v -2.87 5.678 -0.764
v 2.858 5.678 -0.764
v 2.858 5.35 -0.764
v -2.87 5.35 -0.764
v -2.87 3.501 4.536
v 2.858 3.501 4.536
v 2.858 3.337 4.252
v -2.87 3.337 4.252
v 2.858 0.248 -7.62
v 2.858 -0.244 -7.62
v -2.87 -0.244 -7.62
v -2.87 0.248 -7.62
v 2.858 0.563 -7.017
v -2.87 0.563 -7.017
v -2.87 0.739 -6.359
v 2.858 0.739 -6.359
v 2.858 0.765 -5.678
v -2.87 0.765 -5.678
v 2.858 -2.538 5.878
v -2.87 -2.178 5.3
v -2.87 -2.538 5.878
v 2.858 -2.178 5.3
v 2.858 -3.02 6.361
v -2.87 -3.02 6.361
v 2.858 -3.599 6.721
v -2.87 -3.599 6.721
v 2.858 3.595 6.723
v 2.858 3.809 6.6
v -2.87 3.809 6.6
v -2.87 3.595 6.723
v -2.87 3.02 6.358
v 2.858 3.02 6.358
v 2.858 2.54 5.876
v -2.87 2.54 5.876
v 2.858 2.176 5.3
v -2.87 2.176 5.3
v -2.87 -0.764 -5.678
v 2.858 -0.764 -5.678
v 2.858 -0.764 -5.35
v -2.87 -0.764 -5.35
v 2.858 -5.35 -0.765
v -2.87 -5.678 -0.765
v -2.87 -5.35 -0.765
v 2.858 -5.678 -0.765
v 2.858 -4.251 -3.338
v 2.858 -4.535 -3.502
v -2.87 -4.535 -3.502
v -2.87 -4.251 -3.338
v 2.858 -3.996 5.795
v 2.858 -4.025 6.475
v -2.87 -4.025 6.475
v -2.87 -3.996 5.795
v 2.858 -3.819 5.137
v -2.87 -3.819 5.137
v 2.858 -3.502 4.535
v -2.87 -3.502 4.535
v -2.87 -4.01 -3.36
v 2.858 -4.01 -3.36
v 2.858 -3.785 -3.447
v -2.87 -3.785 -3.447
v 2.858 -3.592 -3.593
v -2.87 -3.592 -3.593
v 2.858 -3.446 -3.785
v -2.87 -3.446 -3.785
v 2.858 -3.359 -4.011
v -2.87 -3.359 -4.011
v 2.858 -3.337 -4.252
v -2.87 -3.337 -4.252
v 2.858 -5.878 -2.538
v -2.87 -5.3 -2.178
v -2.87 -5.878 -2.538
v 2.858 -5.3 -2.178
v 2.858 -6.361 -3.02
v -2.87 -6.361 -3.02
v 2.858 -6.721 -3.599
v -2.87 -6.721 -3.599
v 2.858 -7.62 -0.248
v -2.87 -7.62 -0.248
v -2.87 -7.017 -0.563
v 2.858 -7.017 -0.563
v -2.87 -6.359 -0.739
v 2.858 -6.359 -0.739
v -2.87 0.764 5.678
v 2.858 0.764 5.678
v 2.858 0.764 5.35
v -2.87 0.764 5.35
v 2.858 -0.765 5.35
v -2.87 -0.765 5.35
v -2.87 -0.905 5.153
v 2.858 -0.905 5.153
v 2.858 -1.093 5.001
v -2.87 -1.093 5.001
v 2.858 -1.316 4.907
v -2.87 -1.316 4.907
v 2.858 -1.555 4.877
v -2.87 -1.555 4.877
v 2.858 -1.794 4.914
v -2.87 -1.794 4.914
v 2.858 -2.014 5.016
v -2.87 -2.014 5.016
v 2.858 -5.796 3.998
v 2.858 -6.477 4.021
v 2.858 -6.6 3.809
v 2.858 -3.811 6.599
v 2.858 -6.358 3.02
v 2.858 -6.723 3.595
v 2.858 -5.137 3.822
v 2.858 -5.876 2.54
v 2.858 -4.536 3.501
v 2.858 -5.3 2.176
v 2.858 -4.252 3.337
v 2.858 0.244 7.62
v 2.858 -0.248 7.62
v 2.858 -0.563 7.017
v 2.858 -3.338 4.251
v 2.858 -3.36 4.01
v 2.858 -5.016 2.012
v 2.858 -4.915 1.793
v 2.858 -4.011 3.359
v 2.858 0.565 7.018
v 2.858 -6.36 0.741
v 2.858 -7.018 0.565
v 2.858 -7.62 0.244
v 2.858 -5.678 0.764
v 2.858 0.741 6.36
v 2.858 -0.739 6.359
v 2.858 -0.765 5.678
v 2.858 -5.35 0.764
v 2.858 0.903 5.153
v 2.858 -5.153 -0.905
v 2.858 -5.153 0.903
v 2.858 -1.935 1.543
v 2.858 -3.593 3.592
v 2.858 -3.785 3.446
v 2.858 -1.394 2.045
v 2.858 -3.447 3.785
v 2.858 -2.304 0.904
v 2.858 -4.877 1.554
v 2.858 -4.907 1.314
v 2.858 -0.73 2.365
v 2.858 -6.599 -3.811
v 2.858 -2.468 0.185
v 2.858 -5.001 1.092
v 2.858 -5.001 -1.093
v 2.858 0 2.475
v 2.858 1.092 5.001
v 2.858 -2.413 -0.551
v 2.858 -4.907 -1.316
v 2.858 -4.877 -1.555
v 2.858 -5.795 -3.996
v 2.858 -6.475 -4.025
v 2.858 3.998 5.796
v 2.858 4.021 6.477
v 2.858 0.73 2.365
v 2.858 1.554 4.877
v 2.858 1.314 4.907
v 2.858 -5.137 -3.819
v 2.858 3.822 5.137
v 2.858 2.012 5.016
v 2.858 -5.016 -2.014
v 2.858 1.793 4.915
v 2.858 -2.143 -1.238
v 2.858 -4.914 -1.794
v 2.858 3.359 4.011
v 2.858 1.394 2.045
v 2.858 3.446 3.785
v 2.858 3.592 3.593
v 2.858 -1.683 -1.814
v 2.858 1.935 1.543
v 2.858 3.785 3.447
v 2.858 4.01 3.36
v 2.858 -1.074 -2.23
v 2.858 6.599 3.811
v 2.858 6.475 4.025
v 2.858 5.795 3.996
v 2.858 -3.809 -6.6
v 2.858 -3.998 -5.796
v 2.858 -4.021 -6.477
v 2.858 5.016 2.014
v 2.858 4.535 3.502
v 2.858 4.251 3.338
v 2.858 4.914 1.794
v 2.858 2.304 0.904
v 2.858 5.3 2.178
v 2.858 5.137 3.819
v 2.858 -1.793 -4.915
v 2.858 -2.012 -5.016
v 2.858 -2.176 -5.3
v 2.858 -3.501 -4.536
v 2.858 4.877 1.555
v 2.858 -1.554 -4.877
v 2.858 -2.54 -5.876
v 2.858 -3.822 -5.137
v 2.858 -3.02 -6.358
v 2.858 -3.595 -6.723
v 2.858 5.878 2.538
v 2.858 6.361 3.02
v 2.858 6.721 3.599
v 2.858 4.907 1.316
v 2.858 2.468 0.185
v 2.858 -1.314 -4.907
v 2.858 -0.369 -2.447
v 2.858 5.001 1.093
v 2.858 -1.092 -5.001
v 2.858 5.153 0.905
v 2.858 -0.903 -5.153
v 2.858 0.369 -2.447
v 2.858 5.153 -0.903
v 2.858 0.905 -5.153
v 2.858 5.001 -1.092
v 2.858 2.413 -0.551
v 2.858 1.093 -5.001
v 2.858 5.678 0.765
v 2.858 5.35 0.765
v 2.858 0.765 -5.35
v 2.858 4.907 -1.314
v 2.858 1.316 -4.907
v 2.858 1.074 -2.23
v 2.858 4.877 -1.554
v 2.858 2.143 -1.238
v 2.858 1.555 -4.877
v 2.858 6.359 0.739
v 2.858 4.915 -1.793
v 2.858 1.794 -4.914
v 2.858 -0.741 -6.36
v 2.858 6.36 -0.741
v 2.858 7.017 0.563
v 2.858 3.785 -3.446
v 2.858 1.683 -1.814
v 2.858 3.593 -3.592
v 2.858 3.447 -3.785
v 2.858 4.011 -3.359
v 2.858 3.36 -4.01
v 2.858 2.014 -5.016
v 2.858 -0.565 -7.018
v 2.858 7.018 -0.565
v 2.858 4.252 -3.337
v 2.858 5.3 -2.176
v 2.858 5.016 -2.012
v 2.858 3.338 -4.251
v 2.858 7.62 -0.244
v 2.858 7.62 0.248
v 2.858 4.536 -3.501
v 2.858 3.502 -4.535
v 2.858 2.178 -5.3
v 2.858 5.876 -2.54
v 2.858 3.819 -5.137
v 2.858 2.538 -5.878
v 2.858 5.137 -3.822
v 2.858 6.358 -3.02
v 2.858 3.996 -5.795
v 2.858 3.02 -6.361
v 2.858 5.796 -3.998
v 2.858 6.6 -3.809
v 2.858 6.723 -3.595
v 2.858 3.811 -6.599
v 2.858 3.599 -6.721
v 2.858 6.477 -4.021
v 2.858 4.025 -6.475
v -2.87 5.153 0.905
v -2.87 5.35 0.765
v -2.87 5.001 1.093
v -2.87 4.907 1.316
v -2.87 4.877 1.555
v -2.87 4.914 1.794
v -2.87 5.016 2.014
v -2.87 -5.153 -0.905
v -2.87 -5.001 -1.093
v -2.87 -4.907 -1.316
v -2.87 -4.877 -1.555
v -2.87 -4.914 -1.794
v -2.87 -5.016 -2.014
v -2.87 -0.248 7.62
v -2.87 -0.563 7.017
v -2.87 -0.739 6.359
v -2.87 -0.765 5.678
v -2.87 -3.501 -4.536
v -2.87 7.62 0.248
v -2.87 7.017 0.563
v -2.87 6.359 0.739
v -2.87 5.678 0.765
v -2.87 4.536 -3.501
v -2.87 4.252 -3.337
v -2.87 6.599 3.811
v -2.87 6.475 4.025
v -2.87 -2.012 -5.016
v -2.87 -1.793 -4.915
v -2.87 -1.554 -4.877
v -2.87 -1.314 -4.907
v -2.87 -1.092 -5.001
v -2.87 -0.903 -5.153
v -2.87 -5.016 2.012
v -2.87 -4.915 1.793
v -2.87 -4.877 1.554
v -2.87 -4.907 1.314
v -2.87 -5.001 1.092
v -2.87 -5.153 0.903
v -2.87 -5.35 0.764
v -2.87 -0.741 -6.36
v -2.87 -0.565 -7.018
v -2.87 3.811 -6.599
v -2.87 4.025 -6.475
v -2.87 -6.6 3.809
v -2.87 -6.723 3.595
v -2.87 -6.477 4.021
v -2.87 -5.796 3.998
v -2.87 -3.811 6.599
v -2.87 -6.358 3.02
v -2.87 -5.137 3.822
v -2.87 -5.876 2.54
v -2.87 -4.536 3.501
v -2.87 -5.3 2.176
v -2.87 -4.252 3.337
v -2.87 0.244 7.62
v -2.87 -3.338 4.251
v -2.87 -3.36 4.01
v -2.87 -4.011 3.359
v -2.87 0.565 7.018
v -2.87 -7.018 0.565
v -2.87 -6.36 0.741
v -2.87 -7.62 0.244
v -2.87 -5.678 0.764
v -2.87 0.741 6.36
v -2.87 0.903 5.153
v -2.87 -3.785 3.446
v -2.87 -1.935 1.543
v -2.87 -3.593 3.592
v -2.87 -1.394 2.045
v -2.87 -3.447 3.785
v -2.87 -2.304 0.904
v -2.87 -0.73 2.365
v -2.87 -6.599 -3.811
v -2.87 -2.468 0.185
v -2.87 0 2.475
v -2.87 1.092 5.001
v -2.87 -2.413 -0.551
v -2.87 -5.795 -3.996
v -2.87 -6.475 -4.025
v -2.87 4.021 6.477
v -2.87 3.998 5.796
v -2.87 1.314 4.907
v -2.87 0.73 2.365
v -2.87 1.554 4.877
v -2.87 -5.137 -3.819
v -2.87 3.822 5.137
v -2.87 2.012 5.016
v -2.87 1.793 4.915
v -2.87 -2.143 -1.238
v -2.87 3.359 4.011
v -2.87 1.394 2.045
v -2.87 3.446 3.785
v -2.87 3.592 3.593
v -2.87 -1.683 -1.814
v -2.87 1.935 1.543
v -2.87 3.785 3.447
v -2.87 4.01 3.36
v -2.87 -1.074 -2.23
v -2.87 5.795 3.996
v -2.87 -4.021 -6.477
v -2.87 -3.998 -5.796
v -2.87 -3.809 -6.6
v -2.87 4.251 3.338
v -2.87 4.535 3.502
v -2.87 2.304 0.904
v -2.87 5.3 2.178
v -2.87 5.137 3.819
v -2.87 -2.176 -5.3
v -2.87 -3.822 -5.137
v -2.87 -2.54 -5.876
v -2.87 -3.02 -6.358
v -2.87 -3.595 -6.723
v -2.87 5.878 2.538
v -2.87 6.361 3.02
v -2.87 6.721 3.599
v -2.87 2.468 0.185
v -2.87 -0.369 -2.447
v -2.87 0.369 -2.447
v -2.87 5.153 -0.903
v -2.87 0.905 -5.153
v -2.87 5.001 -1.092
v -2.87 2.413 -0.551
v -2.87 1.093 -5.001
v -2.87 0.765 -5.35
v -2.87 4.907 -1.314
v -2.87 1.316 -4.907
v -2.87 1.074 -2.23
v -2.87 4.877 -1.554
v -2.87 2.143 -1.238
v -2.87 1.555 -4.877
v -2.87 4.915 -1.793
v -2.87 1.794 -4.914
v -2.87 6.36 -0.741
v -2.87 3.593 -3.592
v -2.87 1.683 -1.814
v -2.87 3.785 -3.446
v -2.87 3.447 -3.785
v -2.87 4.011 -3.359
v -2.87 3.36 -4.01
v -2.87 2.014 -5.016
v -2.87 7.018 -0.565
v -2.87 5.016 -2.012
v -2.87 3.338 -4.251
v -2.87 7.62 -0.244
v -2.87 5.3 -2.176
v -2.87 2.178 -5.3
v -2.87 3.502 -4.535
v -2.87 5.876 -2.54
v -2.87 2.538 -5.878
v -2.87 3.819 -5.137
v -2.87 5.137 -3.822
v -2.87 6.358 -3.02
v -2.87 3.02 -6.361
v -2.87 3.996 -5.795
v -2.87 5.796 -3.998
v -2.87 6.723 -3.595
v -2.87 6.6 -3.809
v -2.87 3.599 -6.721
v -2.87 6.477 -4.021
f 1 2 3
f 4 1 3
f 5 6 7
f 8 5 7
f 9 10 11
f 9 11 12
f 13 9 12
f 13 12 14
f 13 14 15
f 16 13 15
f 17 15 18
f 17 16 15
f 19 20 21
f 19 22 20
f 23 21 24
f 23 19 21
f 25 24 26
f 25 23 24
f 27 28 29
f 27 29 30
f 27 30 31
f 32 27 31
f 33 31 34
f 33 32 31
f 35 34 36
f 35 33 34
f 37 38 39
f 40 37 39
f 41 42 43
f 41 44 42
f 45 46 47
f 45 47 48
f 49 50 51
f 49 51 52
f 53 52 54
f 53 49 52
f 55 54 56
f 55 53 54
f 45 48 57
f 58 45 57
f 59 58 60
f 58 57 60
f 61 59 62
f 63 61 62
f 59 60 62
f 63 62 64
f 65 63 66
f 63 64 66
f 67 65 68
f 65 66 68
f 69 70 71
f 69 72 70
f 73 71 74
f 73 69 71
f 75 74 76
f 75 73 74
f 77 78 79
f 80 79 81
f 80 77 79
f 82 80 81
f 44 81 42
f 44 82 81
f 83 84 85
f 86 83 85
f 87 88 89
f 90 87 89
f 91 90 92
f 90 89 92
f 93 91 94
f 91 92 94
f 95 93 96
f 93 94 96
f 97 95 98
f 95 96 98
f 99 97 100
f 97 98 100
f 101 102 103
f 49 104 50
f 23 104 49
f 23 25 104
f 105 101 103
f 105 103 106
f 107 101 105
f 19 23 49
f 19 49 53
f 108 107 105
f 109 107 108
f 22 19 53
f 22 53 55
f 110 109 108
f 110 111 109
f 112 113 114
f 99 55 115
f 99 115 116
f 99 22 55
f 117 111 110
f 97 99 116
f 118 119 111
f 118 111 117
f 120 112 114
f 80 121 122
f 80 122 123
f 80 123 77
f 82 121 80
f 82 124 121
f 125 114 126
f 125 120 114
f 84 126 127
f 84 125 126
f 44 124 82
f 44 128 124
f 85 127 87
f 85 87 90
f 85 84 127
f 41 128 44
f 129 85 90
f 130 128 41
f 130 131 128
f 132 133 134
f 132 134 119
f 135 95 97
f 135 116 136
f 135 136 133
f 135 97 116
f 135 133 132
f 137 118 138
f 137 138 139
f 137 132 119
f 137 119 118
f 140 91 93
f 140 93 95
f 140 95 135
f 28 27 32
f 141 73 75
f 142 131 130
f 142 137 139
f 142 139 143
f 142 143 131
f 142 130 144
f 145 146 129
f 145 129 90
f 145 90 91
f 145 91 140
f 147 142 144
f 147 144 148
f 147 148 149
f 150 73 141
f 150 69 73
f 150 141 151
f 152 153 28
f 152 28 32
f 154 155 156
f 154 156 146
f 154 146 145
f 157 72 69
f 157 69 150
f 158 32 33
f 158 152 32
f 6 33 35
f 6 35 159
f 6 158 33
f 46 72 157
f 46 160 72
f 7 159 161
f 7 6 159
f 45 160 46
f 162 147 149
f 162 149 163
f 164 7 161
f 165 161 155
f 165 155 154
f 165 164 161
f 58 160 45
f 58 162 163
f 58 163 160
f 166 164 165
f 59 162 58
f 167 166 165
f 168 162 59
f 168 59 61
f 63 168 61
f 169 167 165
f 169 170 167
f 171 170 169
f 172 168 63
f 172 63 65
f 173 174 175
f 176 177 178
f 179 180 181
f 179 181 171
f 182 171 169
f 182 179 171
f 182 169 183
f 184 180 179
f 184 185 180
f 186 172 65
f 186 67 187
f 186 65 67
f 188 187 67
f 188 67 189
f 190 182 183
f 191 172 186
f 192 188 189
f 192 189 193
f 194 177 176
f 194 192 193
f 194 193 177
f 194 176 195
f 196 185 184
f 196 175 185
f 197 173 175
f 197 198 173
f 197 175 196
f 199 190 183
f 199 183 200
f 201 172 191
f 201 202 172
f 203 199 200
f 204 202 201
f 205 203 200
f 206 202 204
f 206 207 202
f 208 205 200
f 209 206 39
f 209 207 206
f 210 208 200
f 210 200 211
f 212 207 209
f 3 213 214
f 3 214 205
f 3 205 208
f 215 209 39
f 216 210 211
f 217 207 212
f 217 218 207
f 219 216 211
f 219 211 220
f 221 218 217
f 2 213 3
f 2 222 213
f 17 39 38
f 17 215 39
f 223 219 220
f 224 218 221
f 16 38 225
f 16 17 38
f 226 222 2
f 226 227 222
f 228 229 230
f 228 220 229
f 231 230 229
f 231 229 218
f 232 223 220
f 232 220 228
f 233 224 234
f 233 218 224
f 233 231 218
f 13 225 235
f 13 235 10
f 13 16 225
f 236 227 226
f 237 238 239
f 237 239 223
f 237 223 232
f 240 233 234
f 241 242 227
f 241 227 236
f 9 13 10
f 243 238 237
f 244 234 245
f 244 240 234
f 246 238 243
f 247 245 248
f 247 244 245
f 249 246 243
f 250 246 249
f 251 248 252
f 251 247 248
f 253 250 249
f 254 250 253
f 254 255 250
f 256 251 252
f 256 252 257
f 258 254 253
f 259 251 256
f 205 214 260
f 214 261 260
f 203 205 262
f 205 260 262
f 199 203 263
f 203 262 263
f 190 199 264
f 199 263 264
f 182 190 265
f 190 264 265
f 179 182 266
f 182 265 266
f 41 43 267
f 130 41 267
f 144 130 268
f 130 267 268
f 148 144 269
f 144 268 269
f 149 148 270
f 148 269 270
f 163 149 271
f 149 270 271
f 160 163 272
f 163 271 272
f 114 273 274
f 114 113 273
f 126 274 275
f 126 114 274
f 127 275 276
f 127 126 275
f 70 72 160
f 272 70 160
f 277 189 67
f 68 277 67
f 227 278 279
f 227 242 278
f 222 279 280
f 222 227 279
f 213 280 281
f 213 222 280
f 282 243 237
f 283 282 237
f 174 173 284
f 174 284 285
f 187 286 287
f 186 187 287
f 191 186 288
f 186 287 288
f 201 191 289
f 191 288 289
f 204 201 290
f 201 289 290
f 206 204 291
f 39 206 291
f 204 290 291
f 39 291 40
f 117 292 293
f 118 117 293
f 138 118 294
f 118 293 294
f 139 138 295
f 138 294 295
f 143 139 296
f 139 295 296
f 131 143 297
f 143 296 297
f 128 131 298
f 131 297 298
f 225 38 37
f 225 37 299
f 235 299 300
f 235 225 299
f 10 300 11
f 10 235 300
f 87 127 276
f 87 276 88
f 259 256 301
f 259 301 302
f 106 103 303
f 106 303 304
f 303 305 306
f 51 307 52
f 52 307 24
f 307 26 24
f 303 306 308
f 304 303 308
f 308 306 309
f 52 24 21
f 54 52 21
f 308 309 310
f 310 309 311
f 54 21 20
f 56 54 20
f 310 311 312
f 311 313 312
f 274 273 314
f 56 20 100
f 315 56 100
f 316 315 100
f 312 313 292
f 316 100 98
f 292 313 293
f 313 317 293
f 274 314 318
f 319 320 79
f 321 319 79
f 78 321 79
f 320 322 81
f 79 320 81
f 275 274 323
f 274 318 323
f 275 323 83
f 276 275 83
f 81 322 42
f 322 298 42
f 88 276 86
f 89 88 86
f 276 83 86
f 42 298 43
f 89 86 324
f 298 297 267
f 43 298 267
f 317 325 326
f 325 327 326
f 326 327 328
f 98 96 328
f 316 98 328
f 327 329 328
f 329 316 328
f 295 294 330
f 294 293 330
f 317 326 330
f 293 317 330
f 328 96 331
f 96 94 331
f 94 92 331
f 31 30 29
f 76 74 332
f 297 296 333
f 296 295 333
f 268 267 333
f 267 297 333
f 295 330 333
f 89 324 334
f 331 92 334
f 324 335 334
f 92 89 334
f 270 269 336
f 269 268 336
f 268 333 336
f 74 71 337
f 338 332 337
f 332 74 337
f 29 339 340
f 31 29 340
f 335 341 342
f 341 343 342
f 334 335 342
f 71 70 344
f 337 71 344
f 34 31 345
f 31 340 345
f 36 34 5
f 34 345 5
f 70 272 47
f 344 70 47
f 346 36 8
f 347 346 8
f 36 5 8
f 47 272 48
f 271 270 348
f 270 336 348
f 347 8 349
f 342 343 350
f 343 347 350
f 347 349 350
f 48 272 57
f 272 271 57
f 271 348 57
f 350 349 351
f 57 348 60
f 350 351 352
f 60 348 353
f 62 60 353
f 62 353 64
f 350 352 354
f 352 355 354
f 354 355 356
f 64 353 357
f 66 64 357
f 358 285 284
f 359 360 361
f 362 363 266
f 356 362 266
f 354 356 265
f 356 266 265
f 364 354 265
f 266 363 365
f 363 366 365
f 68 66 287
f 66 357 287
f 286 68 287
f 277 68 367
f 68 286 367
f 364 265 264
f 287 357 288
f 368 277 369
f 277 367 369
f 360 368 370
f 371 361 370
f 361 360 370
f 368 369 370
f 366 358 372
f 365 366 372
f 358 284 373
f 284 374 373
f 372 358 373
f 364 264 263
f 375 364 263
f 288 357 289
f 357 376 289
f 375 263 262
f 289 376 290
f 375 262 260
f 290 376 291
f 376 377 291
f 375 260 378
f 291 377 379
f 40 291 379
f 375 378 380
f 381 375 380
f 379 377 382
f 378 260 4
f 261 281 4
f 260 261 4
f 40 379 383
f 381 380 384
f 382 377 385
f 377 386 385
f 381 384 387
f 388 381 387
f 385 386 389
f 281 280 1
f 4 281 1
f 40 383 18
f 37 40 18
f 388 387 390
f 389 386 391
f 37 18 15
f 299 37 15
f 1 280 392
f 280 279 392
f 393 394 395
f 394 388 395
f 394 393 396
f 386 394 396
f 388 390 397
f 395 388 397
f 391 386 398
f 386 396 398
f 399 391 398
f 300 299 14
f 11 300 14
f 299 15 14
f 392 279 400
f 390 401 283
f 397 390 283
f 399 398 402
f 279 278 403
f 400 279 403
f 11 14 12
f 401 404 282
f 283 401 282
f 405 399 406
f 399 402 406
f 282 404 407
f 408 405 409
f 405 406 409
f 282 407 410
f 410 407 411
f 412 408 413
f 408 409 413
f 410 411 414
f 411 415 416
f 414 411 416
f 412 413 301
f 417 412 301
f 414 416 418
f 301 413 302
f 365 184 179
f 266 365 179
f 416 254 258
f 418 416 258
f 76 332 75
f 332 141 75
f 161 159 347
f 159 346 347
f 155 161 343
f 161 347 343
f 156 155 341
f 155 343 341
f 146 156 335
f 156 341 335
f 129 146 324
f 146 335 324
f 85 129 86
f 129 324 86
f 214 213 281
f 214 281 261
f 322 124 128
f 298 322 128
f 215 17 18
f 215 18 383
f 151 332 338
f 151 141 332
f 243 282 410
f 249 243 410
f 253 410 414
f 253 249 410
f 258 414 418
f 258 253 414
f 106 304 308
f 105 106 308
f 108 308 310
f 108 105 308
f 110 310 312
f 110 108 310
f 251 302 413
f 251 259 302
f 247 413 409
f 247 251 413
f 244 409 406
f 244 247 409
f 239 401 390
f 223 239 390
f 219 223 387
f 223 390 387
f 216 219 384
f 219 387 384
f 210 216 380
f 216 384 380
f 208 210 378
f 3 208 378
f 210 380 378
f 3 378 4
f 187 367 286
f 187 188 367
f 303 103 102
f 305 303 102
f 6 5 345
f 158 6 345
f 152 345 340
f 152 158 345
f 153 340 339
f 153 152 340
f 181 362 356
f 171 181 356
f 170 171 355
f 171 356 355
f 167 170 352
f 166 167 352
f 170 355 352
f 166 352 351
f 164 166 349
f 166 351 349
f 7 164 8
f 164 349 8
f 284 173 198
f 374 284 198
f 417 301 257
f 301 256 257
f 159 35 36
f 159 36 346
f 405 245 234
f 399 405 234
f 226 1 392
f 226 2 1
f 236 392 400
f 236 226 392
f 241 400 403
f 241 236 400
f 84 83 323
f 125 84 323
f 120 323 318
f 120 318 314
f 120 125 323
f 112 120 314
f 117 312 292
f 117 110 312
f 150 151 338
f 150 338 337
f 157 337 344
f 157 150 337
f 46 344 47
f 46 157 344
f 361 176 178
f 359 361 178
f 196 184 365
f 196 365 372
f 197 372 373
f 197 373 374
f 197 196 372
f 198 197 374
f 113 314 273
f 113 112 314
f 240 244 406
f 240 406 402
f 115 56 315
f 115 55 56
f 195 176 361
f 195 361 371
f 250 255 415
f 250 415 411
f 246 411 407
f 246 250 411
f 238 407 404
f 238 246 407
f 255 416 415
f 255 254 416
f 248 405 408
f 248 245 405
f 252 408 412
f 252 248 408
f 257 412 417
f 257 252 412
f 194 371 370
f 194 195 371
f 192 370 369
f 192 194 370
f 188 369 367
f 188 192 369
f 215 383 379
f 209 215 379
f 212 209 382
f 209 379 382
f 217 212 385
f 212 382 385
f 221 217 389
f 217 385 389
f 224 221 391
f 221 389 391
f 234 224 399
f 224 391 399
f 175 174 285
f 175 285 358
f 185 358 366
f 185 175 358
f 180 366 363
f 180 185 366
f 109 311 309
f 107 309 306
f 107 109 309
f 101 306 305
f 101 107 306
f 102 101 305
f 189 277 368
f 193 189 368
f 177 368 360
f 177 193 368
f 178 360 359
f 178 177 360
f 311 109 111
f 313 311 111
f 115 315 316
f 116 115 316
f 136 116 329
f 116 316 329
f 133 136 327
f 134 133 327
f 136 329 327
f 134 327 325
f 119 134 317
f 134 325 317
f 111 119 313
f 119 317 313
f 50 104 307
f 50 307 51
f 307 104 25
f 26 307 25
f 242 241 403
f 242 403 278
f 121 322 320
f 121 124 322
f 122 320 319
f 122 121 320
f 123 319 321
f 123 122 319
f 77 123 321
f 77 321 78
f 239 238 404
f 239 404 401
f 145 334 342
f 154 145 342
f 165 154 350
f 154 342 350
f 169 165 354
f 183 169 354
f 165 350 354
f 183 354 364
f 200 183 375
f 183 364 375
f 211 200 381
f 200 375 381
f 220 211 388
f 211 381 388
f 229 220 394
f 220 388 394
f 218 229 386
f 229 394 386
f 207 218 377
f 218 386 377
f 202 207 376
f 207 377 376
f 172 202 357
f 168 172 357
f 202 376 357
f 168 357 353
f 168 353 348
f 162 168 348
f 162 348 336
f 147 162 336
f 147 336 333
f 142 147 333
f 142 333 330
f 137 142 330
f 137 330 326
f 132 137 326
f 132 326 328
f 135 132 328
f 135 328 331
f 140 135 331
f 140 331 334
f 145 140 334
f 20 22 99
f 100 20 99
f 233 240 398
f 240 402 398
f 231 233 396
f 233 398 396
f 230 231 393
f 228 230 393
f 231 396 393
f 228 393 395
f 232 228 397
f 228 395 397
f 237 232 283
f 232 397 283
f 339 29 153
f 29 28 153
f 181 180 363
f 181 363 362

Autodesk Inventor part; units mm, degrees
ref_plane "YZ Plane" through (0, 0, 0) normal (1, 0, 0) x (0, 1, 0)
ref_plane "XZ Plane" through (0, 0, 0) normal (0, 1, 0) x (-1, 0, 0)
ref_plane "Work Plane2" through (2.8575, 0, 0) normal (1, 0, 0) x (0, 0, -1)
sketch "Sketch6" plane through (2.8575, 0, 0) normal (1, 0, 0) x (0, 0, -1)
  line L0 (0.7654, -5.6784) -> (0.7654, -5.022)
  line L1 (-0.7638, -5.6784) -> (-0.7638, -5.0222)
  arc A0 (5.6006, 2.3498) -> (5.5837, 2.3418) centre (6.3532, 0.7382) ccw
  arc A1 (-0.7638, -5.0222) -> (0.7654, -5.022) centre (0, 0) ccw
  line L2 (0.0008, -7.62) -> (-0.2439, -7.62)
  line L3 (0.0008, -7.62) -> (0.2479, -7.62)
  arc A2 (0.2479, -7.62) -> (0.7654, -5.6784) centre (-2.309, -5.8988) ccw
  arc A3 (-0.7638, -5.6784) -> (-0.2439, -7.62) centre (2.2185, -5.9201) ccw
  arc A4 (3.5877, -3.5965) -> (3.5976, -3.5866) centre (0, 0) ccw
  line L4 (3.502, -4.5349) -> (3.1738, -3.9665)
  line L5 (2.1777, -5.2996) -> (1.8496, -4.7313)
  arc A5 (1.8496, -4.7313) -> (3.1738, -3.9665) centre (0, 0) ccw
  line L6 (3.8107, -6.5987) -> (3.5988, -6.721)
  line L7 (3.8107, -6.5987) -> (4.0247, -6.4752)
  arc A6 (4.0247, -6.4752) -> (3.502, -4.5349) centre (0.9498, -6.263) ccw
  arc A7 (2.1777, -5.2996) -> (3.5988, -6.721) centre (4.8813, -4.0177) ccw
  line L8 (5.3003, -2.1764) -> (4.7319, -1.8482)
  line L9 (4.5358, -3.5007) -> (3.9675, -3.1726)
  arc A8 (3.9675, -3.1726) -> (4.7319, -1.8482) centre (0, 0) ccw
  line L10 (6.5995, -3.8093) -> (6.4772, -4.0212)
  line L11 (6.5995, -3.8093) -> (6.7231, -3.5953)
  arc A9 (6.7231, -3.5953) -> (5.3003, -2.1764) centre (3.954, -4.949) ccw
  arc A10 (4.5358, -3.5007) -> (6.4772, -4.0212) centre (6.2362, -1.0388) ccw
  line L12 (5.6784, 0.7654) -> (5.022, 0.7654)
  line L13 (5.6784, -0.7638) -> (5.0222, -0.7638)
  arc A11 (5.0222, -0.7638) -> (5.022, 0.7654) centre (0, 0) ccw
  line L14 (7.62, 0.0008) -> (7.62, -0.2439)
  line L15 (7.62, 0.0008) -> (7.62, 0.2479)
  arc A12 (7.62, 0.2479) -> (5.6784, 0.7654) centre (5.8988, -2.309) ccw
  arc A13 (5.6784, -0.7638) -> (7.62, -0.2439) centre (5.9201, 2.2185) ccw
  line L16 (4.5349, 3.502) -> (3.9665, 3.1738)
  line L17 (5.2996, 2.1777) -> (4.7313, 1.8496)
  arc A14 (4.7313, 1.8496) -> (3.9665, 3.1738) centre (0, 0) ccw
  line L18 (6.5987, 3.8107) -> (6.721, 3.5988)
  line L19 (6.5987, 3.8107) -> (6.4752, 4.0247)
  arc A15 (6.4752, 4.0247) -> (4.5349, 3.502) centre (6.263, 0.9498) ccw
  arc A16 (5.2996, 2.1777) -> (6.721, 3.5988) centre (4.0177, 4.8813) ccw
  line L20 (2.1764, 5.3003) -> (1.8482, 4.7319)
  line L21 (3.5007, 4.5358) -> (3.1726, 3.9675)
  arc A17 (3.1726, 3.9675) -> (1.8482, 4.7319) centre (0, 0) ccw
  line L22 (3.8093, 6.5995) -> (4.0212, 6.4772)
  line L23 (3.8093, 6.5995) -> (3.5953, 6.7231)
  arc A18 (3.5953, 6.7231) -> (2.1764, 5.3003) centre (4.949, 3.954) ccw
  arc A19 (3.5007, 4.5358) -> (4.0212, 6.4772) centre (1.0388, 6.2362) ccw
  line L24 (-0.7654, 5.6784) -> (-0.7654, 5.022)
  line L25 (0.7638, 5.6784) -> (0.7638, 5.0222)
  arc A20 (0.7638, 5.0222) -> (-0.7654, 5.022) centre (0, 0) ccw
  line L26 (-0.0008, 7.62) -> (0.2439, 7.62)
  line L27 (-0.0008, 7.62) -> (-0.2479, 7.62)
  arc A21 (-0.2479, 7.62) -> (-0.7654, 5.6784) centre (2.309, 5.8988) ccw
  arc A22 (0.7638, 5.6784) -> (0.2439, 7.62) centre (-2.2185, 5.9201) ccw
  line L28 (-3.502, 4.5349) -> (-3.1738, 3.9665)
  line L29 (-2.1777, 5.2996) -> (-1.8496, 4.7313)
  arc A23 (-1.8496, 4.7313) -> (-3.1738, 3.9665) centre (0, 0) ccw
  line L30 (-3.8107, 6.5987) -> (-3.5988, 6.721)
  line L31 (-3.8107, 6.5987) -> (-4.0247, 6.4752)
  arc A24 (-4.0247, 6.4752) -> (-3.502, 4.5349) centre (-0.9498, 6.263) ccw
  arc A25 (-2.1777, 5.2996) -> (-3.5988, 6.721) centre (-4.8813, 4.0177) ccw
  line L32 (-5.3003, 2.1764) -> (-4.7319, 1.8482)
  line L33 (-4.5358, 3.5007) -> (-3.9675, 3.1726)
  arc A26 (-3.9675, 3.1726) -> (-4.7319, 1.8482) centre (0, 0) ccw
  line L34 (-6.5995, 3.8093) -> (-6.4772, 4.0212)
  line L35 (-6.5995, 3.8093) -> (-6.7231, 3.5953)
  arc A27 (-6.7231, 3.5953) -> (-5.3003, 2.1764) centre (-3.954, 4.949) ccw
  arc A28 (-4.5358, 3.5007) -> (-6.4772, 4.0212) centre (-6.2362, 1.0388) ccw
  line L36 (-5.6784, -0.7654) -> (-5.022, -0.7654)
  line L37 (-5.6784, 0.7638) -> (-5.0222, 0.7638)
  arc A29 (-5.0222, 0.7638) -> (-5.022, -0.7654) centre (0, 0) ccw
  line L38 (-7.62, -0.0008) -> (-7.62, 0.2439)
  line L39 (-7.62, -0.0008) -> (-7.62, -0.2479)
  arc A30 (-7.62, -0.2479) -> (-5.6784, -0.7654) centre (-5.8988, 2.309) ccw
  arc A31 (-5.6784, 0.7638) -> (-7.62, 0.2439) centre (-5.9201, -2.2185) ccw
  line L40 (-4.5349, -3.502) -> (-3.9665, -3.1738)
  line L41 (-5.2996, -2.1777) -> (-4.7313, -1.8496)
  arc A32 (-4.7313, -1.8496) -> (-3.9665, -3.1738) centre (0, 0) ccw
  line L42 (-6.5987, -3.8107) -> (-6.721, -3.5988)
  line L43 (-6.5987, -3.8107) -> (-6.4752, -4.0247)
  arc A33 (-6.4752, -4.0247) -> (-4.5349, -3.502) centre (-6.263, -0.9498) ccw
  arc A34 (-5.2996, -2.1777) -> (-6.721, -3.5988) centre (-4.0177, -4.8813) ccw
  line L44 (-2.1764, -5.3003) -> (-1.8482, -4.7319)
  line L45 (-3.5007, -4.5358) -> (-3.1726, -3.9675)
  arc A35 (-3.1726, -3.9675) -> (-1.8482, -4.7319) centre (0, 0) ccw
  line L46 (-3.8093, -6.5995) -> (-4.0212, -6.4772)
  line L47 (-3.8093, -6.5995) -> (-3.5953, -6.7231)
  arc A36 (-3.5953, -6.7231) -> (-2.1764, -5.3003) centre (-4.949, -3.954) ccw
  arc A37 (-3.5007, -4.5358) -> (-4.0212, -6.4772) centre (-1.0388, -6.2362) ccw
  arc A38 (-1.8482, -4.7319) -> (-0.7638, -5.0222) centre (0, 0) ccw
  line L48 (-2.0137, 5.0155) -> (-0.7654, 5.3502)
  line L49 (0.7638, 5.3503) -> (2.0123, 5.0161)
  line L50 (3.3367, 4.2516) -> (4.2507, 3.3379)
  line L51 (5.0155, 2.0137) -> (5.3502, 0.7654)
  line L52 (5.3503, -0.7638) -> (5.0161, -2.0123)
  line L53 (4.2516, -3.3367) -> (3.3379, -4.2507)
  line L54 (2.0137, -5.0155) -> (0.7654, -5.3502)
  line L55 (-0.7638, -5.3503) -> (-2.0123, -5.0161)
  line L56 (-3.3367, -4.2516) -> (-4.2507, -3.3379)
  line L57 (-5.0155, -2.0137) -> (-5.3502, -0.7654)
  line L58 (-5.3503, 0.7638) -> (-5.0161, 2.0123)
  line L59 (-4.2516, 3.3367) -> (-3.3379, 4.2507)
  circle A39 centre (0, 0) radius 5.0531
  point P0 (0, 0)
  point P1 (-4.2516, 3.3367)
  dimension "d94" = 360
extrude "Extrusion19" add sketch "Sketch6" against normal blind 5.7277 contours A2 L3 L2 A3 L1 A1 L0 | L0 A1 A38 A35 L45 L56 L40 A32 L41 L57 L36 A29 L37 L58 L32 A26 L33 L59 L28 A23 L29 L48 L24 A20 L25 L49 L20 A17 L21 L50 L16 A14 L17 L51 L12 A11 L13 L52 L8 A8 L9 L53 L4 A5 L5 L54 | L5 A5 L4 A6 L7 L6 A7 | L1 L55 L44 A38 | L44 A36 L47 L46 A37 L45 A35 | L9 A8 L8 A9 L11 L10 A10 | L40 A33 L43 L42 A34 L41 A32 | L13 A11 L12 A12 L15 L14 A13 | L36 A30 L39 L38 A31 L37 A29 | L17 A14 L16 A15 L19 L18 A16 | L32 A27 L35 L34 A28 L33 A26 | L21 A17 L20 A18 L23 L22 A19 | L28 A24 L31 L30 A25 L29 A23 | L25 A20 L24 A21 L27 L26 A22 | A39
sketch "Sketch7" plane through (-2.8702, 0, 0) normal (-1, 0, 0) x (0, 0, 1)
  circle A0 centre (0, 0) radius 2.475
  dimension "d104" = 4.95
extrude "Extrusion20" cut sketch "Sketch7" against normal blind 2540
sketch "Sketch8" plane through (-2.8702, 0, 0) normal (-1, 0, 0) x (0, 0, 1)
  circle A0 centre (0, 0) radius 5.08
  line L0 (-3.3367, 4.2516) -> (-4.2507, 3.3379) projected
  arc A1 (-4.2507, 3.3379) -> (-3.3367, 4.2516) centre (-4.209, 4.2103) ccw
  line L1 (-3.3367, 4.2516) -> (-3.5007, 4.5358) projected
  line L2 (-4.2507, 3.3379) -> (-3.3367, 4.2516)
  arc A2 (-5.3502, 0.7654) -> (-5.0155, 2.0137) centre (-5.7503, 1.5417) ccw
  line L3 (-5.3502, 0.7654) -> (-5.0155, 2.0137)
  arc A3 (-5.0161, -2.0123) -> (-5.3503, -0.7638) centre (-5.7507, -1.54) ccw
  line L4 (-5.0161, -2.0123) -> (-5.3503, -0.7638)
  arc A4 (-3.3379, -4.2507) -> (-4.2516, -3.3367) centre (-4.2103, -4.209) ccw
  line L5 (-3.3379, -4.2507) -> (-4.2516, -3.3367)
  arc A5 (-0.7654, -5.3502) -> (-2.0137, -5.0155) centre (-1.5417, -5.7503) ccw
  line L6 (-0.7654, -5.3502) -> (-2.0137, -5.0155)
  arc A6 (2.0123, -5.0161) -> (0.7638, -5.3503) centre (1.54, -5.7507) ccw
  line L7 (2.0123, -5.0161) -> (0.7638, -5.3503)
  arc A7 (4.2507, -3.3379) -> (3.3367, -4.2516) centre (4.209, -4.2103) ccw
  line L8 (4.2507, -3.3379) -> (3.3367, -4.2516)
  arc A8 (5.3502, -0.7654) -> (5.0155, -2.0137) centre (5.7503, -1.5417) ccw
  line L9 (5.3502, -0.7654) -> (5.0155, -2.0137)
  arc A9 (5.0161, 2.0123) -> (5.3503, 0.7638) centre (5.7507, 1.54) ccw
  line L10 (5.0161, 2.0123) -> (5.3503, 0.7638)
  arc A10 (3.3379, 4.2507) -> (4.2516, 3.3367) centre (4.2103, 4.209) ccw
  line L11 (3.3379, 4.2507) -> (4.2516, 3.3367)
  arc A11 (0.7654, 5.3502) -> (2.0137, 5.0155) centre (1.5417, 5.7503) ccw
  line L12 (0.7654, 5.3502) -> (2.0137, 5.0155)
  arc A12 (-2.0123, 5.0161) -> (-0.7638, 5.3503) centre (-1.54, 5.7507) ccw
  line L13 (-2.0123, 5.0161) -> (-0.7638, 5.3503)
  dimension "d107" = 10.16
  dimension "d110" = 360
extrude "Extrusion21" cut sketch "Sketch8" against normal blind 2540 contours A8 L9 | A7 L8 | A6 L7 | A5 L6 | A4 L5 | A3 L4 | A2 L3 | A1 L0 | A12 L13 | A11 L12 | A10 L11 | A9 L10
properties part number "Alligator_Pinion (2)"
